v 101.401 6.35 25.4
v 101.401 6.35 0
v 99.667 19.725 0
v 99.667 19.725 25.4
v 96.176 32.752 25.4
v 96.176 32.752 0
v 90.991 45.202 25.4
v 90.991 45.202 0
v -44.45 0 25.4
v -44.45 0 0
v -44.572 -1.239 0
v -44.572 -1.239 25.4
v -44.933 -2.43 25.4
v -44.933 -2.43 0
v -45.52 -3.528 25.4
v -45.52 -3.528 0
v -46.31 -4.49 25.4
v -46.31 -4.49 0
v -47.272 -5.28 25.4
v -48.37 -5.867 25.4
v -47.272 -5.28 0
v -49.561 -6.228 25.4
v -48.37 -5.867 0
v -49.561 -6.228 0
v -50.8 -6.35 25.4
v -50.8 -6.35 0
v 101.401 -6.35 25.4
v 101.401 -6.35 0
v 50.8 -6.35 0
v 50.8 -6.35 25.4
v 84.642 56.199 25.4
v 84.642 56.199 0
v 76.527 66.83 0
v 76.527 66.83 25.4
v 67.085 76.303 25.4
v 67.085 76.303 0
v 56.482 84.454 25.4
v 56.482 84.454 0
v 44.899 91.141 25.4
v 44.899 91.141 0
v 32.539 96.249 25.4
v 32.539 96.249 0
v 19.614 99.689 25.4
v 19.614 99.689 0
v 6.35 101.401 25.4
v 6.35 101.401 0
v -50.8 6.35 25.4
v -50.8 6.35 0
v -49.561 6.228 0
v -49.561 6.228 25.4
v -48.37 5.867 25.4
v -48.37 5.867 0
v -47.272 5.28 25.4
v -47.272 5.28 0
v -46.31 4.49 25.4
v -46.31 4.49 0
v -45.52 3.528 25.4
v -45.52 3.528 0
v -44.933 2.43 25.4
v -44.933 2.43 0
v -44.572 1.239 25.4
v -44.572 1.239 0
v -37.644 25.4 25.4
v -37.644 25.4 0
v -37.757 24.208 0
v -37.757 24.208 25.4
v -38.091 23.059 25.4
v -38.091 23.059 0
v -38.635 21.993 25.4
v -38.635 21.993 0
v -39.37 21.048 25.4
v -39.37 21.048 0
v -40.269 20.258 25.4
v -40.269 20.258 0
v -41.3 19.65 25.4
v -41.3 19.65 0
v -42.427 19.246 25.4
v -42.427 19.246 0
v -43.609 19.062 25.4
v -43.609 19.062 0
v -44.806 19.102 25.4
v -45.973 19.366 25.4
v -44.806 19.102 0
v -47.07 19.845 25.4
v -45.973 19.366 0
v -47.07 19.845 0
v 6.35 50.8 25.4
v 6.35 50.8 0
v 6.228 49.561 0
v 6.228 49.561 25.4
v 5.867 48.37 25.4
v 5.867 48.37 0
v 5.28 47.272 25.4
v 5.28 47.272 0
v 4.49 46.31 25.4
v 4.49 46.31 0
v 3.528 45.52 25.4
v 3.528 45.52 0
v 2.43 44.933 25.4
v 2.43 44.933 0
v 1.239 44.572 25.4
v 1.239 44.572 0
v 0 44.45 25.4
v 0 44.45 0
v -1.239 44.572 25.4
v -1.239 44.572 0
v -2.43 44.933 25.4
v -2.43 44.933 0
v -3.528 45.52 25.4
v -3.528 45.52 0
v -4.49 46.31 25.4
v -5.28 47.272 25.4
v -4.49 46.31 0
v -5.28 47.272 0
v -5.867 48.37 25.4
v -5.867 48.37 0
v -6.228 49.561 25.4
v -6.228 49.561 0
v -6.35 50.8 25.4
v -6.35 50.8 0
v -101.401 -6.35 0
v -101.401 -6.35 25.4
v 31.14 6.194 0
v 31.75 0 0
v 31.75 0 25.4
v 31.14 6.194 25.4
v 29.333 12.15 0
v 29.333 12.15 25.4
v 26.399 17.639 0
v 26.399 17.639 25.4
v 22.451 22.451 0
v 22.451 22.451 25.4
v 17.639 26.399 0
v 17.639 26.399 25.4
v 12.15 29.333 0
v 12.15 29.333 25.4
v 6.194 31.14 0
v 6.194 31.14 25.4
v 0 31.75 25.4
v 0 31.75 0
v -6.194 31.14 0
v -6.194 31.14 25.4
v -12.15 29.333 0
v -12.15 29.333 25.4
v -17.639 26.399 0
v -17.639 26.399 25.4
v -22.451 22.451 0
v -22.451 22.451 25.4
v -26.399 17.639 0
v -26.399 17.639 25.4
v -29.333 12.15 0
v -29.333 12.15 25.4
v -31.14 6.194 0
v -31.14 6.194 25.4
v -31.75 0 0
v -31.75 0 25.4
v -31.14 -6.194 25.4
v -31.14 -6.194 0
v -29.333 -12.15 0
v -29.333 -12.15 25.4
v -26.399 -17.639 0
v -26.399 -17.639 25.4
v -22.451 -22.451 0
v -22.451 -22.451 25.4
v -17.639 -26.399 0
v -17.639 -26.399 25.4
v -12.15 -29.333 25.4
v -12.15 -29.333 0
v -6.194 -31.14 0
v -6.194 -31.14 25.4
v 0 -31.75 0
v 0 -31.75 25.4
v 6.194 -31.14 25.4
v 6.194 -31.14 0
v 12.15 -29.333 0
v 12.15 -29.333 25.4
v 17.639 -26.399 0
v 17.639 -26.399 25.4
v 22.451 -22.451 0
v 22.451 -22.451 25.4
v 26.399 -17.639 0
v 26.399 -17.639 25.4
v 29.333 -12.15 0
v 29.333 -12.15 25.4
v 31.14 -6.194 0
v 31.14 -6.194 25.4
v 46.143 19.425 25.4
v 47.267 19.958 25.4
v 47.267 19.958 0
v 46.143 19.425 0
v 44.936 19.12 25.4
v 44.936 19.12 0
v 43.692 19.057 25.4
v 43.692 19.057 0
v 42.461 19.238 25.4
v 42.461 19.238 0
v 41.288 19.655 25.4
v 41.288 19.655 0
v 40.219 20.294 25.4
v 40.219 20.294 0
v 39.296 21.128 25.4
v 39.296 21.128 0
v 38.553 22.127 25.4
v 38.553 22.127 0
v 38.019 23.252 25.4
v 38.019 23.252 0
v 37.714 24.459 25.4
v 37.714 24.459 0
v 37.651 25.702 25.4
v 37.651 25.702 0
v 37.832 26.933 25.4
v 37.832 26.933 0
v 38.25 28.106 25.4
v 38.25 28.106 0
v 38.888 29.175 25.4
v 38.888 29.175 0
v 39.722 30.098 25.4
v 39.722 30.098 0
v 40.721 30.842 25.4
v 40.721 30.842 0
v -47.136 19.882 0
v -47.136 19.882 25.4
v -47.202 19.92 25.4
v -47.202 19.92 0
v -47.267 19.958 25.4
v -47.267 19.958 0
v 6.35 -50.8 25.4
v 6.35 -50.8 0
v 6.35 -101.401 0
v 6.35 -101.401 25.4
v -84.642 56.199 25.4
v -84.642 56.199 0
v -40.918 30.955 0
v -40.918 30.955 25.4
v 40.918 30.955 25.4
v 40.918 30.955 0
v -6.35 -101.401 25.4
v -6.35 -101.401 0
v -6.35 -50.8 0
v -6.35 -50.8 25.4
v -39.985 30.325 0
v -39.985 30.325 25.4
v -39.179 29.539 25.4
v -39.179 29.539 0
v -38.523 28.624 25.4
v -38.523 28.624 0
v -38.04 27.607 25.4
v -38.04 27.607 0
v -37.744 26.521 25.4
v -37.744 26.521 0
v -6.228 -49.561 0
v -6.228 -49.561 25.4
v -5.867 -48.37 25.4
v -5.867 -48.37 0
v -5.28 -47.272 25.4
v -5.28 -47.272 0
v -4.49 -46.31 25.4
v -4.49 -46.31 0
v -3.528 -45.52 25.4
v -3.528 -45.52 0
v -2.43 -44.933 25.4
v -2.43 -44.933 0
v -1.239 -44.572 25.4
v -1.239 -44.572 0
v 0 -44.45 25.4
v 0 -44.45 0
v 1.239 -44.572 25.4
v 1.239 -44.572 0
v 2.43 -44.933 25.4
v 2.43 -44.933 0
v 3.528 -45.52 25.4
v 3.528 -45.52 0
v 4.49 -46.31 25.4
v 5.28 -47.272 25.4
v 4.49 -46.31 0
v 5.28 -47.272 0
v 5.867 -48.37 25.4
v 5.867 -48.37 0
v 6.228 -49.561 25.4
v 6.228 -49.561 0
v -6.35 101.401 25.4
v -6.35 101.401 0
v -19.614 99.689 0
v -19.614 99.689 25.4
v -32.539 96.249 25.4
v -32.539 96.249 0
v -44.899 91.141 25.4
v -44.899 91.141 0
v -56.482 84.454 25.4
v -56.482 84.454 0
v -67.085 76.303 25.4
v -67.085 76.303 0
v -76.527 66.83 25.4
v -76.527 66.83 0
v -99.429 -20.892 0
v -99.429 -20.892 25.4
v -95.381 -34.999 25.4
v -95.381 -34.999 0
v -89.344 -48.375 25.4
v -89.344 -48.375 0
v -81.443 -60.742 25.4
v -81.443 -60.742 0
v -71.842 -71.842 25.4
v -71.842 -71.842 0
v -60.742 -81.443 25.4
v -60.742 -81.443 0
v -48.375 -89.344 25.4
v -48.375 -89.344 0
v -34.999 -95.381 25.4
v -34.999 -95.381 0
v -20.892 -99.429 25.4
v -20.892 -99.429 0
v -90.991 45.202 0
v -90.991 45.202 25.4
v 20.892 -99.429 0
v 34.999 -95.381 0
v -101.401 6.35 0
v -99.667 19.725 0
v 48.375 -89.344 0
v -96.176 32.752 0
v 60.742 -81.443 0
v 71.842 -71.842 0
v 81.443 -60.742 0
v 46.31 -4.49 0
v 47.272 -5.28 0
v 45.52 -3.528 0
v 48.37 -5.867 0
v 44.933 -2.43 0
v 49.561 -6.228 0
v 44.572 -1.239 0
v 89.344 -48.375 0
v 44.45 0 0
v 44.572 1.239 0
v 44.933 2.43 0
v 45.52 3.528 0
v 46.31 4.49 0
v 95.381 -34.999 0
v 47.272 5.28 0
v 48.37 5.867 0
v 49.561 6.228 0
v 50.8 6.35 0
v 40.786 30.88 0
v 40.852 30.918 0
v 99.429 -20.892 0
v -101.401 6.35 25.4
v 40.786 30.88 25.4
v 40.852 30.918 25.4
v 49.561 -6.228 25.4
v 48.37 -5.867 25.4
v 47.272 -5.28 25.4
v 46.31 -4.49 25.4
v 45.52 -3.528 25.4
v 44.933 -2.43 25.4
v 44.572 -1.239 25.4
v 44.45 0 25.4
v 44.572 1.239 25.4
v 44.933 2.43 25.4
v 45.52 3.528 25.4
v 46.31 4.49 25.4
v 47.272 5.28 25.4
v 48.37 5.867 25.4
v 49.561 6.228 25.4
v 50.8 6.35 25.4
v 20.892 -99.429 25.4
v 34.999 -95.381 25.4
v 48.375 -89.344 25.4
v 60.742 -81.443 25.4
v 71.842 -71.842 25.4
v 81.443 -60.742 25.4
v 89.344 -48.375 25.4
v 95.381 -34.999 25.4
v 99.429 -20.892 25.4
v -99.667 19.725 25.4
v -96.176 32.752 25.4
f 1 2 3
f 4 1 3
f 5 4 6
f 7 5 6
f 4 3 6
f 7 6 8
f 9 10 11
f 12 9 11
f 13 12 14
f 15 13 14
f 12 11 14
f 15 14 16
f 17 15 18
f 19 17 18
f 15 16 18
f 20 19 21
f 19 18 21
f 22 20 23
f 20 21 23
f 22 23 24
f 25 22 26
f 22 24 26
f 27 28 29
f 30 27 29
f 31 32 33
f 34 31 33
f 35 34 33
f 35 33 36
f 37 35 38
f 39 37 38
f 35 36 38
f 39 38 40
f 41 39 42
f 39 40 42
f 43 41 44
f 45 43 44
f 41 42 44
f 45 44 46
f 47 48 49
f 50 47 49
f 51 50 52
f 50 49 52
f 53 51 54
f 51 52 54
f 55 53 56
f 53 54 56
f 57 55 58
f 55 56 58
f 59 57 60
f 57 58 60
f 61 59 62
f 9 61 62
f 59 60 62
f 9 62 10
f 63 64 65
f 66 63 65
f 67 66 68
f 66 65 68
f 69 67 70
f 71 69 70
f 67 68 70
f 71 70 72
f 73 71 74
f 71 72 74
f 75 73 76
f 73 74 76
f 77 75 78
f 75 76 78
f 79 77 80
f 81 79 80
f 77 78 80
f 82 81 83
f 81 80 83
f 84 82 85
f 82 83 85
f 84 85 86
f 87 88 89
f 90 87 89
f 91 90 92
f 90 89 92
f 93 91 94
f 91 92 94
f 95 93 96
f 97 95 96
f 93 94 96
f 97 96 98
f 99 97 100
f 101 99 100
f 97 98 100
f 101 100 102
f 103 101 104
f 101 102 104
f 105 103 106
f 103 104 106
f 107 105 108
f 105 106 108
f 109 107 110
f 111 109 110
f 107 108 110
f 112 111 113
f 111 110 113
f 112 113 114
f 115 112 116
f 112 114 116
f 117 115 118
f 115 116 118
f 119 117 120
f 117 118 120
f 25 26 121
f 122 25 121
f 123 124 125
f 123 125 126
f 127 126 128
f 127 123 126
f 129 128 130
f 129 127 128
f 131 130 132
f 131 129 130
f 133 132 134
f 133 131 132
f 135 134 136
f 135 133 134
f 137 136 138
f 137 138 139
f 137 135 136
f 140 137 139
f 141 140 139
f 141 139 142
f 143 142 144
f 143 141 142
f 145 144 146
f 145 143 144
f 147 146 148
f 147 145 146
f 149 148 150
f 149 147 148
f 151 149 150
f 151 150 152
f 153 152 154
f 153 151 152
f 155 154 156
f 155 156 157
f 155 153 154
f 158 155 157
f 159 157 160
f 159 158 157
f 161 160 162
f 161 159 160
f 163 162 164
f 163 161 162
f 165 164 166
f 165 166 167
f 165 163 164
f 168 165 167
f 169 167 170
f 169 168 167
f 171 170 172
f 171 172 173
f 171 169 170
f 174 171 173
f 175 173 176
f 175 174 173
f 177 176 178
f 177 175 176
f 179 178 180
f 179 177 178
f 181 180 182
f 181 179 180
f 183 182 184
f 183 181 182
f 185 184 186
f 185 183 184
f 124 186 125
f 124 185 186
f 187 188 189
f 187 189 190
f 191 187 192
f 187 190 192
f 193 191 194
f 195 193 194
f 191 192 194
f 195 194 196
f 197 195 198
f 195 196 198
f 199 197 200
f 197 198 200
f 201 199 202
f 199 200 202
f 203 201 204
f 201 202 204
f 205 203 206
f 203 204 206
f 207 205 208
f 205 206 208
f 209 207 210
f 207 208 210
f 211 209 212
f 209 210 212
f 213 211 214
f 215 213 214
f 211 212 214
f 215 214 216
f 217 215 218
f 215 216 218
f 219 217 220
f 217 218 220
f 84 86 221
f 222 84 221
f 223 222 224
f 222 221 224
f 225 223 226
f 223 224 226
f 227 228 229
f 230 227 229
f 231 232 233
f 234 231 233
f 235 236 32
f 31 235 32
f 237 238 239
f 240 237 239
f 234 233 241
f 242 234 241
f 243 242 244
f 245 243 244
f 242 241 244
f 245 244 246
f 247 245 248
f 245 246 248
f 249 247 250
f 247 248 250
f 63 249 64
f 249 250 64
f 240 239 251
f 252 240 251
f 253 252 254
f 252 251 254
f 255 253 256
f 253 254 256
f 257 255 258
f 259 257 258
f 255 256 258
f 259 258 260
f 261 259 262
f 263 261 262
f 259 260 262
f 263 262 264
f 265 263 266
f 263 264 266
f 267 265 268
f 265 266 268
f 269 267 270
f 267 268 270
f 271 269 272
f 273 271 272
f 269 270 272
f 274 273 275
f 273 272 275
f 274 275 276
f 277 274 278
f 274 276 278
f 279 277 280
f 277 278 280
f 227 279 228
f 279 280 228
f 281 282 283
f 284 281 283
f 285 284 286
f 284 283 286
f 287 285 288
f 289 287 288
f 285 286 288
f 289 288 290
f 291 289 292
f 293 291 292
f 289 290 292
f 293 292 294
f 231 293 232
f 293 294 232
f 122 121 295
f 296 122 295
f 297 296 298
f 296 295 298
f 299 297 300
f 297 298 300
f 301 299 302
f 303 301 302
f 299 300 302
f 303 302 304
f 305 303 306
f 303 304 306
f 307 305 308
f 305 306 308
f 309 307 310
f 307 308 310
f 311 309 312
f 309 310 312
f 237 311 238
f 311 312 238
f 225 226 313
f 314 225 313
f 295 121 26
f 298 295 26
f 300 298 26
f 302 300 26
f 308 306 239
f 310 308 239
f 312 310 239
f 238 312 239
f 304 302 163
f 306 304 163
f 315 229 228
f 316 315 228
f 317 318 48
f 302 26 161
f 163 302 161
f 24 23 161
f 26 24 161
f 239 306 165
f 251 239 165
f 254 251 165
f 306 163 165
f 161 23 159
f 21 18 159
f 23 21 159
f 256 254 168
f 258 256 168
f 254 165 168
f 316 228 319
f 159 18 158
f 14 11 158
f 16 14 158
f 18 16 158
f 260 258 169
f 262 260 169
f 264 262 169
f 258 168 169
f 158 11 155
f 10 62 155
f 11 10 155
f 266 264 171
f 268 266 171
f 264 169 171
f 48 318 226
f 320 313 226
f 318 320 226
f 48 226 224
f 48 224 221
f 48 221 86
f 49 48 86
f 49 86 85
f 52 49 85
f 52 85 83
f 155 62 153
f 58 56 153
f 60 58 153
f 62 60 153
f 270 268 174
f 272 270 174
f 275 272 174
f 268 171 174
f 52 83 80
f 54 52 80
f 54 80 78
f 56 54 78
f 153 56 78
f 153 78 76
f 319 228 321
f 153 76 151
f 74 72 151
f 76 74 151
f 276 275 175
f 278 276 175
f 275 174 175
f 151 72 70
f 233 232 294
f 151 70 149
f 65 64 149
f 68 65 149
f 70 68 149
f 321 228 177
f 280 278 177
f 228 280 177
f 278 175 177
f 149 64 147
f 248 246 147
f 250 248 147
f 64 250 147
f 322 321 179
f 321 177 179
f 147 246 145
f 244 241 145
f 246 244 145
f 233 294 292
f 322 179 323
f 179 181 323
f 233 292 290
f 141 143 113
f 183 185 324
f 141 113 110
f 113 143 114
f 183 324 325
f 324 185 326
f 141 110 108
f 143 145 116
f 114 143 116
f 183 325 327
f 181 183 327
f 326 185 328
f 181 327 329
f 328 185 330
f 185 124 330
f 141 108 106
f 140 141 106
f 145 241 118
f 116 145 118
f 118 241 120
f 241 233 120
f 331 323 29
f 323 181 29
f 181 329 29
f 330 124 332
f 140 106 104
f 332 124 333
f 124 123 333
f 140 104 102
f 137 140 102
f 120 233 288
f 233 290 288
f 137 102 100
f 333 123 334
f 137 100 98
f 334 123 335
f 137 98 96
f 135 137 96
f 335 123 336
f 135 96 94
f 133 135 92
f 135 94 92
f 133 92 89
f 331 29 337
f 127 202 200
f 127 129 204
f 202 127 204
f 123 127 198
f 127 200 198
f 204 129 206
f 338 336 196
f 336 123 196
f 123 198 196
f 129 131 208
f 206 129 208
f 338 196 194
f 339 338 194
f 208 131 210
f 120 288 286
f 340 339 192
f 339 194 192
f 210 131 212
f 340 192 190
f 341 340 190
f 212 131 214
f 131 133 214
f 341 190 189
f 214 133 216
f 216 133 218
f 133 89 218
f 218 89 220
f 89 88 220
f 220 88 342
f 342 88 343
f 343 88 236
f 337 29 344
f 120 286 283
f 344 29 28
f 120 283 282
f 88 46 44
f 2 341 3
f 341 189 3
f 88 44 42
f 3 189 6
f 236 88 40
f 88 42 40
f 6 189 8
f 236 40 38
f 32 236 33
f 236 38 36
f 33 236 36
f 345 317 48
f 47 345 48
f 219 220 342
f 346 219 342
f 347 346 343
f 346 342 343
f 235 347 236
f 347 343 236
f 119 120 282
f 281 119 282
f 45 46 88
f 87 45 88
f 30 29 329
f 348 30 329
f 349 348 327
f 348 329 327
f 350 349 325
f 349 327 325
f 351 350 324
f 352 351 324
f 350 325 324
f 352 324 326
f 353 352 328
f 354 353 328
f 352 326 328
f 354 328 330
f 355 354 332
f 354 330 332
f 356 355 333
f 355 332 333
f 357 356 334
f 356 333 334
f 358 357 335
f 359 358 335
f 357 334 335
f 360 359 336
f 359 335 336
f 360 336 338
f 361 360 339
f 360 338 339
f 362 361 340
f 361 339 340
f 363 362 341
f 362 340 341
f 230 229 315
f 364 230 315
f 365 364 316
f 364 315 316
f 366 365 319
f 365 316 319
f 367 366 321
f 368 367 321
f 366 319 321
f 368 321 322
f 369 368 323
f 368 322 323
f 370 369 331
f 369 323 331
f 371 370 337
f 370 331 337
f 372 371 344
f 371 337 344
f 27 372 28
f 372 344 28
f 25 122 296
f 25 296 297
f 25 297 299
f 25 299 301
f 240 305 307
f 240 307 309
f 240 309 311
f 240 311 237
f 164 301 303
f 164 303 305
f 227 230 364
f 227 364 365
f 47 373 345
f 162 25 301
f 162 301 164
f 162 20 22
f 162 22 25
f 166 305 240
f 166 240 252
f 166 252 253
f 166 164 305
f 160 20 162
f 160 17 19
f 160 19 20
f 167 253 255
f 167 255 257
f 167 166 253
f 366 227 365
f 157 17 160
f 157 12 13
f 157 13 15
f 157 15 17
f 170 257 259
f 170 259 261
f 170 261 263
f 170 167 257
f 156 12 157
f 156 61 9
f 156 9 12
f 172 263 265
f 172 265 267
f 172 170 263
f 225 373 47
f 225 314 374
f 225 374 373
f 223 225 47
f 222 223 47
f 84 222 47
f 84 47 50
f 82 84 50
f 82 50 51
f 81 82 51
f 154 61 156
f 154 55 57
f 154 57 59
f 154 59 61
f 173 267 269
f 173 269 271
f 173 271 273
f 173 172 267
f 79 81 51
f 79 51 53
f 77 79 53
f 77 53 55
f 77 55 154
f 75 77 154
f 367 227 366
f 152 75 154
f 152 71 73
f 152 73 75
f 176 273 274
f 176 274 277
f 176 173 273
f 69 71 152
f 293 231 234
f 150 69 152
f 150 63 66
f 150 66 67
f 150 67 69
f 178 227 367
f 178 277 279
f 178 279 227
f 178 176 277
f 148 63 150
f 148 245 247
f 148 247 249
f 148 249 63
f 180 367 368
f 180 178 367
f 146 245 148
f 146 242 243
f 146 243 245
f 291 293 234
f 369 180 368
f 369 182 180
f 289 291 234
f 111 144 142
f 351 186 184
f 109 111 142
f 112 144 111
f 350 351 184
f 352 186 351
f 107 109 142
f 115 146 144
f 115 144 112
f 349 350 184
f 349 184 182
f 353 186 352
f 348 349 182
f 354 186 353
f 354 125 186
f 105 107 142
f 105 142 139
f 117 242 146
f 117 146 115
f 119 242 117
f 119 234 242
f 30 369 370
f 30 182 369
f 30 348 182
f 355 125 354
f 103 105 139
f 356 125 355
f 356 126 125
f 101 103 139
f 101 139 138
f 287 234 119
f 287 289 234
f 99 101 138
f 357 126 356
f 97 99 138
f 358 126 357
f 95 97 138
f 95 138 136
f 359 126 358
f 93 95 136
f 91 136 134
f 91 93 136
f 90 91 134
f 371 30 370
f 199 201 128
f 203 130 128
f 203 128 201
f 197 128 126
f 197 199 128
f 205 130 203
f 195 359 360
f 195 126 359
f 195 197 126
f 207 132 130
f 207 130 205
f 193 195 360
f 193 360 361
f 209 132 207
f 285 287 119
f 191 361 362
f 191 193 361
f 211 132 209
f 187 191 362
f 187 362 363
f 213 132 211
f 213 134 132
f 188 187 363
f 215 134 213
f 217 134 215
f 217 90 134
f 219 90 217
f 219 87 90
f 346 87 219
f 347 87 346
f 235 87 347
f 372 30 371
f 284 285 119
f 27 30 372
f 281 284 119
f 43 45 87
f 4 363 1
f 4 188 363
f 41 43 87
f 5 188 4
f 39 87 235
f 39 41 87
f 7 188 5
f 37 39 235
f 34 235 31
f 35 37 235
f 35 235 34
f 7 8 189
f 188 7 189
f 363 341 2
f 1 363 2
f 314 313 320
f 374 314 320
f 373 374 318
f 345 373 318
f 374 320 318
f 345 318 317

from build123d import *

# Parameters (mm, degrees)
F0_R     = 31.75
F1_DEPTH = 25.4


with BuildPart() as f1:
    # F0 (on Top) → F1 (new body)
    with BuildSketch(Plane.XY):
        with BuildLine():
            Line((50.8, 6.35), (101.401368, 6.35))
            ThreePointArc((101.401368, 6.35), (98.137932, 26.296508), (90.990707, 45.202336))
            Line((90.990707, 45.202336), (47.267053, 19.958473))
            ThreePointArc((47.267053, 19.958473), (38.552563, 22.127038), (40.721129, 30.841527))
            ThreePointArc((40.721129, 30.841527), (40.819091, 30.899261), (40.918071, 30.955232))
            Line((40.918071, 30.955232), (84.641725, 56.199096))
            ThreePointArc((84.641725, 56.199096), (50.800442, 87.987926), (6.35, 101.401368))
            Line((6.35, 101.401368), (6.35, 50.8))
            ThreePointArc((6.35, 50.8), (0, 44.45), (-6.35, 50.8))
            Line((-6.35, 50.8), (-6.35, 101.401368))
            ThreePointArc((-6.35, 101.401368), (-50.800442, 87.987926), (-84.641725, 56.199096))
            Line((-84.641725, 56.199096), (-40.918071, 30.955232))
            ThreePointArc((-40.918071, 30.955232), (-38.523477, 28.62411), (-37.644091, 25.4))
            ThreePointArc((-37.644091, 25.4), (-40.76998, 19.929386), (-47.07011, 19.844768))
            ThreePointArc((-47.07011, 19.844768), (-47.169091, 19.900739), (-47.267053, 19.958473))
            Line((-47.267053, 19.958473), (-90.990707, 45.202336))
            ThreePointArc((-90.990707, 45.202336), (-98.137932, 26.296508), (-101.401368, 6.35))
            Line((-101.401368, 6.35), (-50.8, 6.35))
            ThreePointArc((-50.8, 6.35), (-46.309872, 4.490128), (-44.45, 0))
            ThreePointArc((-44.45, 0), (-46.309872, -4.490128), (-50.8, -6.35))
            Line((-50.8, -6.35), (-101.401368, -6.35))
            ThreePointArc((-101.401368, -6.35), (-71.842049, -71.842049), (-6.35, -101.401368))
            Line((-6.35, -101.401368), (-6.35, -50.8))
            ThreePointArc((-6.35, -50.8), (0, -44.45), (6.35, -50.8))
            Line((6.35, -50.8), (6.35, -101.401368))
            ThreePointArc((6.35, -101.401368), (71.842049, -71.842049), (101.401368, -6.35))
            Line((101.401368, -6.35), (50.8, -6.35))
            ThreePointArc((50.8, -6.35), (44.45, 0), (50.8, 6.35))
        make_face()
        Circle(F0_R, mode=Mode.SUBTRACT)
    extrude(amount=F1_DEPTH)


solid = f1.part
